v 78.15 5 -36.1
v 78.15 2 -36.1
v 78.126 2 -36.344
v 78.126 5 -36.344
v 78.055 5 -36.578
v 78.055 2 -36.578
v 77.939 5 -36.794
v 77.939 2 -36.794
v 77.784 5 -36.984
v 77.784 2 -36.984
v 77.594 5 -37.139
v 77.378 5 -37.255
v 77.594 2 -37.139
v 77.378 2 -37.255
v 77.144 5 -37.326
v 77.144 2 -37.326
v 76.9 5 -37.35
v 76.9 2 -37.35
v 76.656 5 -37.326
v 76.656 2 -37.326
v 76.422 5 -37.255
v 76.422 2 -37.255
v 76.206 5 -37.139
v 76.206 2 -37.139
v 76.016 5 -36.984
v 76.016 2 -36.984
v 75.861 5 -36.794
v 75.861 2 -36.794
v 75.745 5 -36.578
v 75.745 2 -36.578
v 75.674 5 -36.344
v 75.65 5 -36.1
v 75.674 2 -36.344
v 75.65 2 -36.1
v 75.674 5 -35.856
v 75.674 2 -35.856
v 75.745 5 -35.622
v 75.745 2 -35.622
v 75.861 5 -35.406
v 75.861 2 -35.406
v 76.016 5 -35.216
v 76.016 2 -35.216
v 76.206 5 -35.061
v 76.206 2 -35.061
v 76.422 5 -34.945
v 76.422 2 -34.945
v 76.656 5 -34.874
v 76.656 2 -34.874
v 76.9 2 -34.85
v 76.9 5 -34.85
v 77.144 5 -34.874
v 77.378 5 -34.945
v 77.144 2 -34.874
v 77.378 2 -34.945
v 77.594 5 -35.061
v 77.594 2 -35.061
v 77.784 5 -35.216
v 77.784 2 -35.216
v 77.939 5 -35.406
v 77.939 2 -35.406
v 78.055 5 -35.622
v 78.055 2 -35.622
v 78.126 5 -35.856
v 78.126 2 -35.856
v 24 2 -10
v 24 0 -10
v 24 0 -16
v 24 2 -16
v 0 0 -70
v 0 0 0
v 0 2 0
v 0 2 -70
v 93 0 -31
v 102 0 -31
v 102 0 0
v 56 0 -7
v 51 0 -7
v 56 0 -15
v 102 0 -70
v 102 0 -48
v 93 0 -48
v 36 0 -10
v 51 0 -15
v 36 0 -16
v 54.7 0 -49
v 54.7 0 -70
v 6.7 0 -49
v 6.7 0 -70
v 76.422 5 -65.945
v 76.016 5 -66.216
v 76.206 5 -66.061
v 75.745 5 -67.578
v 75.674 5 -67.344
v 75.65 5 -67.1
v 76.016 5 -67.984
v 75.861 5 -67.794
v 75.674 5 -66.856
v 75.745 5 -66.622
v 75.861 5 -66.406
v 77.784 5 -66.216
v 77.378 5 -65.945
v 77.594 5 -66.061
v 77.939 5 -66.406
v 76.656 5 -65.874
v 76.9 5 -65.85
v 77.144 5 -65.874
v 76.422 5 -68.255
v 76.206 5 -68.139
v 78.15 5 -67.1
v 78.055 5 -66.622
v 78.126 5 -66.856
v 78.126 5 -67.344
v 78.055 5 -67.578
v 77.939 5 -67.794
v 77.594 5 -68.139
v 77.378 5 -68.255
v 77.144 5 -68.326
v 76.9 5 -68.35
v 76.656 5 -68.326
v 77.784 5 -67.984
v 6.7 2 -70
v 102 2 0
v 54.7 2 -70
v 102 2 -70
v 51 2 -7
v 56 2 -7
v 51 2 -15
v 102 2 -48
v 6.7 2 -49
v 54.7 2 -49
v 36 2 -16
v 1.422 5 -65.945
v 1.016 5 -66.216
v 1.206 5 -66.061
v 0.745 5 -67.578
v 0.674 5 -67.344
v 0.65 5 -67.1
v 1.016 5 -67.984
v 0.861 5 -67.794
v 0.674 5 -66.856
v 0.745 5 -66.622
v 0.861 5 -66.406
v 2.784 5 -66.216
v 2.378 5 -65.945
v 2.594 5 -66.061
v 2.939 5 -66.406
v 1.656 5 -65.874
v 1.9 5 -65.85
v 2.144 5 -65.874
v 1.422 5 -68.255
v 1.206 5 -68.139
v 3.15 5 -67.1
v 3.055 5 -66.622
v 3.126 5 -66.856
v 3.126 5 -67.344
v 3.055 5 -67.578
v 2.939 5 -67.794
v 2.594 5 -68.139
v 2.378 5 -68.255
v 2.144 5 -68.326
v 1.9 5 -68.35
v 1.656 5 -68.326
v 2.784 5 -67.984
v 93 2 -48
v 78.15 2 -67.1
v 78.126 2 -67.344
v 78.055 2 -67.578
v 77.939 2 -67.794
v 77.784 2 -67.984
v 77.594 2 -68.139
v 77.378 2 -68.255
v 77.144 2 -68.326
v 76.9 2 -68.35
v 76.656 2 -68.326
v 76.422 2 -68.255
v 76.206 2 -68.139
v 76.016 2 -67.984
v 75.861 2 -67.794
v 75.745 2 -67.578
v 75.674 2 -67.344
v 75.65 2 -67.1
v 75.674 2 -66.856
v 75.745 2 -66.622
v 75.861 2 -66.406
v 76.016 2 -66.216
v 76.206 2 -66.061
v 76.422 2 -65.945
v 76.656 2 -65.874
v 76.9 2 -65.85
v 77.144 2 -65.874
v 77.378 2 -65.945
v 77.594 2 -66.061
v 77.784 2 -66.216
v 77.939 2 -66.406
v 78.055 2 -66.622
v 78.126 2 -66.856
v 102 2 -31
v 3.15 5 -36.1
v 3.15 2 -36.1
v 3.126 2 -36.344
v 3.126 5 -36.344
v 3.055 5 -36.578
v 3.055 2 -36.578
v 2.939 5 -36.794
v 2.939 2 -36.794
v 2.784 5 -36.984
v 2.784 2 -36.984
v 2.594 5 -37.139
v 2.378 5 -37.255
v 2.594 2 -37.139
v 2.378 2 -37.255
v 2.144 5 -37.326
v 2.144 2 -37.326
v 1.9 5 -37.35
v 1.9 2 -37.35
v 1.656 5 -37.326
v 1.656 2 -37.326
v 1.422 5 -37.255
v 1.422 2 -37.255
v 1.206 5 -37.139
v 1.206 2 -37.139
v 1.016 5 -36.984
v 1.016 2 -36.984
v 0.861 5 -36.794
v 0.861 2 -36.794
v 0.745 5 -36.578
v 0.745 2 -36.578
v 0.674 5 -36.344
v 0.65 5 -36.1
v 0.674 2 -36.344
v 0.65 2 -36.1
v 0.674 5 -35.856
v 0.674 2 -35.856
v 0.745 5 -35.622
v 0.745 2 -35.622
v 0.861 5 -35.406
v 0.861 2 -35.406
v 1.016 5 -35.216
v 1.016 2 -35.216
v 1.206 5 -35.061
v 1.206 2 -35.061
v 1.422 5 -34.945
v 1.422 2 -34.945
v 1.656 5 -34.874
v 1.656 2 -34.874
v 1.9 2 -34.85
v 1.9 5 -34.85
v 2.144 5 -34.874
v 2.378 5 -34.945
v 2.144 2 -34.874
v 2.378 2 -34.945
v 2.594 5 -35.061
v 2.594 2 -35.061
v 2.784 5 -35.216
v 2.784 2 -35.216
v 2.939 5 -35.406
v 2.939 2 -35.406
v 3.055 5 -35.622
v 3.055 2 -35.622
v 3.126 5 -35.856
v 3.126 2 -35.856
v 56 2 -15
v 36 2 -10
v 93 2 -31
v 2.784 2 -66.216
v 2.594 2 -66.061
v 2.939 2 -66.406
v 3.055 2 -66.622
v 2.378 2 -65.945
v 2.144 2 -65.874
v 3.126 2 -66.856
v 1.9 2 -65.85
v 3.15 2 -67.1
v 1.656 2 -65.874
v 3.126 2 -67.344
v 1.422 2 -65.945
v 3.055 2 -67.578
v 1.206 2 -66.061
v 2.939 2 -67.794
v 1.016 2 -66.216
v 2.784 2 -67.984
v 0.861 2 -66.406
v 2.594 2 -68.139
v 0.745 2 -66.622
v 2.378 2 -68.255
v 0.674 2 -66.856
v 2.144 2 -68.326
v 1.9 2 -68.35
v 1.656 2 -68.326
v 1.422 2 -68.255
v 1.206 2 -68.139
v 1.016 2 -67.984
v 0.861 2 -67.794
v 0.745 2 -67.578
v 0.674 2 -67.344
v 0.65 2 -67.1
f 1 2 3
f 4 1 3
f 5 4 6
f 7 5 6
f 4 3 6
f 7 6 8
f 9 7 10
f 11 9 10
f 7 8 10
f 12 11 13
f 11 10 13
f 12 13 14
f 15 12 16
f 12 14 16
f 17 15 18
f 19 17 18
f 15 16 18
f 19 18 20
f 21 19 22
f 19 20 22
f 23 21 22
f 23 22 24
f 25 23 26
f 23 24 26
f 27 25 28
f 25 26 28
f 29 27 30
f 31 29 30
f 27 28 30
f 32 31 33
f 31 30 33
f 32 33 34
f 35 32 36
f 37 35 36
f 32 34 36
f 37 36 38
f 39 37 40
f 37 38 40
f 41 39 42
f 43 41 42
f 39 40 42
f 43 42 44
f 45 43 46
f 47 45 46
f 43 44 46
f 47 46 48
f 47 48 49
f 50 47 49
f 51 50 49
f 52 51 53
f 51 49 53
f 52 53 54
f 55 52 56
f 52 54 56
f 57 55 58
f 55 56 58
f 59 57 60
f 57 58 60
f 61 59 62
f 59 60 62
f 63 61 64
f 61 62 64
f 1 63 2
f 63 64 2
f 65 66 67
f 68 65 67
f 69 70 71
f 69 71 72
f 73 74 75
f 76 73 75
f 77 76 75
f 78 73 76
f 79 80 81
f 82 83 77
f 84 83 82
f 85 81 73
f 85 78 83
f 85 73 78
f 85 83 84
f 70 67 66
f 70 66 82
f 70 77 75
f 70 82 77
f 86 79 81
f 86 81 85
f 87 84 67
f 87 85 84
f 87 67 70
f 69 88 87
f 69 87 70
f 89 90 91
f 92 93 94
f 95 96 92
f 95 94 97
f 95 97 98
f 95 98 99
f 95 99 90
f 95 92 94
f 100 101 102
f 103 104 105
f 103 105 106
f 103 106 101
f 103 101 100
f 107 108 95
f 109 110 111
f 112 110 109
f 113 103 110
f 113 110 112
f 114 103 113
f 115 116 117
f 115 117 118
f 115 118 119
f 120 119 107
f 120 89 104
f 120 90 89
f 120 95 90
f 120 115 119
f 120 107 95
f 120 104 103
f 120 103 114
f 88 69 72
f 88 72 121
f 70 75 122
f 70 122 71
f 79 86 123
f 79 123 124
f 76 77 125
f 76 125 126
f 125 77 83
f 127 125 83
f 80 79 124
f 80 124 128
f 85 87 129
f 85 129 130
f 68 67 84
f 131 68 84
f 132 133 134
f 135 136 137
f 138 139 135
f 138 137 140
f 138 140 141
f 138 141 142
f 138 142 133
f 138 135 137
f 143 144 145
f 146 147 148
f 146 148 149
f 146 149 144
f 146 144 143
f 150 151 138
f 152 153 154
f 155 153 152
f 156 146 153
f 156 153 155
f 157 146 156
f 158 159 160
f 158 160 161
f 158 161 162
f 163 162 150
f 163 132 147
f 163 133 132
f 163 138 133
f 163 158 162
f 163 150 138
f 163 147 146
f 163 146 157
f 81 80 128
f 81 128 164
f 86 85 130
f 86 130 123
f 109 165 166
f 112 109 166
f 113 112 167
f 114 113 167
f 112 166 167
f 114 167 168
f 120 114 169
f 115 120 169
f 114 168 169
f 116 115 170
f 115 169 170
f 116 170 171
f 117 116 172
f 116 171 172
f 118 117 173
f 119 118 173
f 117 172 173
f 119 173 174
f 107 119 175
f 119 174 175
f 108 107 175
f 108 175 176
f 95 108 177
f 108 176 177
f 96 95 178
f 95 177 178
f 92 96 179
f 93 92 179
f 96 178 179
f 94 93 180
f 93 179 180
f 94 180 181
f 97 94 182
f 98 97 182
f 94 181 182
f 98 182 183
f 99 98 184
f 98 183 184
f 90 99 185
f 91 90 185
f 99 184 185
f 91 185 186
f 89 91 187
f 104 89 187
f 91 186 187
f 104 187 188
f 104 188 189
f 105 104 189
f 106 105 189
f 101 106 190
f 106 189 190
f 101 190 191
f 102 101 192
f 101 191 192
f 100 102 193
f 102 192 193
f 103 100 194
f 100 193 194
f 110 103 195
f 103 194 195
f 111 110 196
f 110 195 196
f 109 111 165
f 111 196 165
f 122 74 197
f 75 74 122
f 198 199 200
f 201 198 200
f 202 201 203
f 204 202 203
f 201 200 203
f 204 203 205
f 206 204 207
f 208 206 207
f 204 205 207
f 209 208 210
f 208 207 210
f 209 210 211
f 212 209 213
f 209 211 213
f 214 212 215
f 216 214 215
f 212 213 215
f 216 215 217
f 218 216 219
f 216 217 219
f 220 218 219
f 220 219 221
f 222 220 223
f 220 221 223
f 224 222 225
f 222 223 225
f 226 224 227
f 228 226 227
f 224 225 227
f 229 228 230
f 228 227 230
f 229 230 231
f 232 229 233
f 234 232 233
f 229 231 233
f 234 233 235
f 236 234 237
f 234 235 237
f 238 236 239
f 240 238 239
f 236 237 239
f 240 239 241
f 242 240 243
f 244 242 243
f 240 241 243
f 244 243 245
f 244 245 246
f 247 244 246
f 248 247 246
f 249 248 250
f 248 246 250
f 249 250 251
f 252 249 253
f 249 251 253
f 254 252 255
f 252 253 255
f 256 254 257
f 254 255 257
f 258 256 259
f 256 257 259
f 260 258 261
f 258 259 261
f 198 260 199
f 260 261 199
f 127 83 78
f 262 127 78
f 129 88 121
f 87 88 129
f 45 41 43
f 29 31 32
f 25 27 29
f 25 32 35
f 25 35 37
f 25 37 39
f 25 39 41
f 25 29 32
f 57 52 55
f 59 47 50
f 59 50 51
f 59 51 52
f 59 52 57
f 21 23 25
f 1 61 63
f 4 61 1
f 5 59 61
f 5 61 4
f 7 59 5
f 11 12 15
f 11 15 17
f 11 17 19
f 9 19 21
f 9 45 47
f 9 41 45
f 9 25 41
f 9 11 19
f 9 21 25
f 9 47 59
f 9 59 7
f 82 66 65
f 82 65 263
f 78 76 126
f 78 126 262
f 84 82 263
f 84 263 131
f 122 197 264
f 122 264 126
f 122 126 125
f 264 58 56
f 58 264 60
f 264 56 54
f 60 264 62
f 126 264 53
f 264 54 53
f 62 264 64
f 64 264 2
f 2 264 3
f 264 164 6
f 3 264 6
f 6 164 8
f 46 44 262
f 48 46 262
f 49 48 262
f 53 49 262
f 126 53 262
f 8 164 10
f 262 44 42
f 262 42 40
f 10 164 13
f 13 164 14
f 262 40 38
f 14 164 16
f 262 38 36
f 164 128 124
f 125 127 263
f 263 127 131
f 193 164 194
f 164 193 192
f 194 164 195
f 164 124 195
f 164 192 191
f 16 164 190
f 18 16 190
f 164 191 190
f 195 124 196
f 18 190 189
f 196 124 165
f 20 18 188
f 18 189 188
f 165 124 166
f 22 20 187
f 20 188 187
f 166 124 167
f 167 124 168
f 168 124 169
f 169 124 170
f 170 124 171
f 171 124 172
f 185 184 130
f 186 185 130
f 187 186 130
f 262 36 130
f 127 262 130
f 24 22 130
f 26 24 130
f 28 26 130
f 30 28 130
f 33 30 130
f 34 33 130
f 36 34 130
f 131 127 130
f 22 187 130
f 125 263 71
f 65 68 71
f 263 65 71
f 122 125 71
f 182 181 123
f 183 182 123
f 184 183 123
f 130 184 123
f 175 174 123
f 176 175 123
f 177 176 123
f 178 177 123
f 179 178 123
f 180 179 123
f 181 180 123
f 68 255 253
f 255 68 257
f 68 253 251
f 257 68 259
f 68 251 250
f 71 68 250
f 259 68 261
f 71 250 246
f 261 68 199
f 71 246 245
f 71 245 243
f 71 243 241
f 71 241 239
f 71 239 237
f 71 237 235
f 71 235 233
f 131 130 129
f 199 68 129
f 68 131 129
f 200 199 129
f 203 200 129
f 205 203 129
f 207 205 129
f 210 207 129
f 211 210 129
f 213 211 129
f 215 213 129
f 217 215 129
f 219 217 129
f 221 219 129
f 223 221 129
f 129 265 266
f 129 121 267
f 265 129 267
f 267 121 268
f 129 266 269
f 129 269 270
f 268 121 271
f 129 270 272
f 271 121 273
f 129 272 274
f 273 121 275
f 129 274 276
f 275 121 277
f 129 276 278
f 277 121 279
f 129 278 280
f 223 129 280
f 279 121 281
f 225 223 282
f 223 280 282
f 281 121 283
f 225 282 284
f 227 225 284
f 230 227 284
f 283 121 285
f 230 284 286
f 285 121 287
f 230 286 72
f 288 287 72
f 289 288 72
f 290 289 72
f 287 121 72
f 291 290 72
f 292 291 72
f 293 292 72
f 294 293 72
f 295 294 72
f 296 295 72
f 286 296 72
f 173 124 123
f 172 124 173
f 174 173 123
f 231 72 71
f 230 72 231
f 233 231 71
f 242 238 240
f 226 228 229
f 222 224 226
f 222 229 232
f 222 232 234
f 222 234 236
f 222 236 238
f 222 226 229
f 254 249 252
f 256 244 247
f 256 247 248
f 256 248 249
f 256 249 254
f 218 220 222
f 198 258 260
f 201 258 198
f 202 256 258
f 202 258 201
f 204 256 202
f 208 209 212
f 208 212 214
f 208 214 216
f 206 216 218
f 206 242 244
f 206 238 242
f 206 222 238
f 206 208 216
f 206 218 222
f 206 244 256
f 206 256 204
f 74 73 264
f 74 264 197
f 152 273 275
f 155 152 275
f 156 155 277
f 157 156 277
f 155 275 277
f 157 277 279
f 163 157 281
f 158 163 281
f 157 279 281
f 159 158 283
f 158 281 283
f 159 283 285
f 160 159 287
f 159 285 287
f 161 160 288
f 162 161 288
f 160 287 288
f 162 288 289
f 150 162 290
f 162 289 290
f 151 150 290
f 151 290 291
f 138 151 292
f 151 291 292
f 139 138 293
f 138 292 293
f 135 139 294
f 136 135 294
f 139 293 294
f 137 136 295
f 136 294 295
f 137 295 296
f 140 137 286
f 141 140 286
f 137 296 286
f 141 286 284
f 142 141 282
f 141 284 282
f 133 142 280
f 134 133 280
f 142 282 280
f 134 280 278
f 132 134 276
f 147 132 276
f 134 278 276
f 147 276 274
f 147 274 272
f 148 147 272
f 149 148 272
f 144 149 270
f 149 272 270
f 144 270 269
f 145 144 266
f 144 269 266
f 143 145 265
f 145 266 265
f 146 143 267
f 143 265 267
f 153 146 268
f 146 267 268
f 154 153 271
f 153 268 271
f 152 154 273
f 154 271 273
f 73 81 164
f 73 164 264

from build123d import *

# Parameters (mm, degrees)
CROQUIS1_W              = 12
CROQUIS1_H              = 6
CROQUIS1_W_2            = 5
CROQUIS1_H_2            = 8
SALIENTE_EXTRUIR1_DEPTH = 2
CROQUIS2_R              = 1.25
SALIENTE_EXTRUIR2_DEPTH = 3


with BuildPart() as part:
    # Croquis1 → Saliente-Extruir1 (new body)
    with BuildSketch(Plane(origin=(0, 0, 0), x_dir=(1, 0, 0), z_dir=(0, 1, 0))):
        Polygon((0, 70), (6.7, 70), (6.7, 49), (54.7, 49), (54.7, 70), (102, 70), (102, 48), (93, 48), (93, 31), (102, 31), (102, 0), (0, 0), align=None)
        with Locations((30, 13)):
            Rectangle(CROQUIS1_W, CROQUIS1_H, mode=Mode.SUBTRACT)
        with Locations((53.5, 11)):
            Rectangle(CROQUIS1_W_2, CROQUIS1_H_2, mode=Mode.SUBTRACT)
    extrude(amount=SALIENTE_EXTRUIR1_DEPTH)

    # Croquis2 → Saliente-Extruir2 (add)
    with BuildSketch(Plane(origin=(0, 2, 0), x_dir=(1, 0, 0), z_dir=(0, 1, 0))):
        with Locations((1.9, 67.1)):
            Circle(CROQUIS2_R)
        with Locations((1.9, 36.1)):
            Circle(CROQUIS2_R)
        with Locations((76.9, 36.1)):
            Circle(CROQUIS2_R)
        with Locations((76.9, 67.1)):
            Circle(CROQUIS2_R)
    extrude(amount=SALIENTE_EXTRUIR2_DEPTH)


solid = part.part
